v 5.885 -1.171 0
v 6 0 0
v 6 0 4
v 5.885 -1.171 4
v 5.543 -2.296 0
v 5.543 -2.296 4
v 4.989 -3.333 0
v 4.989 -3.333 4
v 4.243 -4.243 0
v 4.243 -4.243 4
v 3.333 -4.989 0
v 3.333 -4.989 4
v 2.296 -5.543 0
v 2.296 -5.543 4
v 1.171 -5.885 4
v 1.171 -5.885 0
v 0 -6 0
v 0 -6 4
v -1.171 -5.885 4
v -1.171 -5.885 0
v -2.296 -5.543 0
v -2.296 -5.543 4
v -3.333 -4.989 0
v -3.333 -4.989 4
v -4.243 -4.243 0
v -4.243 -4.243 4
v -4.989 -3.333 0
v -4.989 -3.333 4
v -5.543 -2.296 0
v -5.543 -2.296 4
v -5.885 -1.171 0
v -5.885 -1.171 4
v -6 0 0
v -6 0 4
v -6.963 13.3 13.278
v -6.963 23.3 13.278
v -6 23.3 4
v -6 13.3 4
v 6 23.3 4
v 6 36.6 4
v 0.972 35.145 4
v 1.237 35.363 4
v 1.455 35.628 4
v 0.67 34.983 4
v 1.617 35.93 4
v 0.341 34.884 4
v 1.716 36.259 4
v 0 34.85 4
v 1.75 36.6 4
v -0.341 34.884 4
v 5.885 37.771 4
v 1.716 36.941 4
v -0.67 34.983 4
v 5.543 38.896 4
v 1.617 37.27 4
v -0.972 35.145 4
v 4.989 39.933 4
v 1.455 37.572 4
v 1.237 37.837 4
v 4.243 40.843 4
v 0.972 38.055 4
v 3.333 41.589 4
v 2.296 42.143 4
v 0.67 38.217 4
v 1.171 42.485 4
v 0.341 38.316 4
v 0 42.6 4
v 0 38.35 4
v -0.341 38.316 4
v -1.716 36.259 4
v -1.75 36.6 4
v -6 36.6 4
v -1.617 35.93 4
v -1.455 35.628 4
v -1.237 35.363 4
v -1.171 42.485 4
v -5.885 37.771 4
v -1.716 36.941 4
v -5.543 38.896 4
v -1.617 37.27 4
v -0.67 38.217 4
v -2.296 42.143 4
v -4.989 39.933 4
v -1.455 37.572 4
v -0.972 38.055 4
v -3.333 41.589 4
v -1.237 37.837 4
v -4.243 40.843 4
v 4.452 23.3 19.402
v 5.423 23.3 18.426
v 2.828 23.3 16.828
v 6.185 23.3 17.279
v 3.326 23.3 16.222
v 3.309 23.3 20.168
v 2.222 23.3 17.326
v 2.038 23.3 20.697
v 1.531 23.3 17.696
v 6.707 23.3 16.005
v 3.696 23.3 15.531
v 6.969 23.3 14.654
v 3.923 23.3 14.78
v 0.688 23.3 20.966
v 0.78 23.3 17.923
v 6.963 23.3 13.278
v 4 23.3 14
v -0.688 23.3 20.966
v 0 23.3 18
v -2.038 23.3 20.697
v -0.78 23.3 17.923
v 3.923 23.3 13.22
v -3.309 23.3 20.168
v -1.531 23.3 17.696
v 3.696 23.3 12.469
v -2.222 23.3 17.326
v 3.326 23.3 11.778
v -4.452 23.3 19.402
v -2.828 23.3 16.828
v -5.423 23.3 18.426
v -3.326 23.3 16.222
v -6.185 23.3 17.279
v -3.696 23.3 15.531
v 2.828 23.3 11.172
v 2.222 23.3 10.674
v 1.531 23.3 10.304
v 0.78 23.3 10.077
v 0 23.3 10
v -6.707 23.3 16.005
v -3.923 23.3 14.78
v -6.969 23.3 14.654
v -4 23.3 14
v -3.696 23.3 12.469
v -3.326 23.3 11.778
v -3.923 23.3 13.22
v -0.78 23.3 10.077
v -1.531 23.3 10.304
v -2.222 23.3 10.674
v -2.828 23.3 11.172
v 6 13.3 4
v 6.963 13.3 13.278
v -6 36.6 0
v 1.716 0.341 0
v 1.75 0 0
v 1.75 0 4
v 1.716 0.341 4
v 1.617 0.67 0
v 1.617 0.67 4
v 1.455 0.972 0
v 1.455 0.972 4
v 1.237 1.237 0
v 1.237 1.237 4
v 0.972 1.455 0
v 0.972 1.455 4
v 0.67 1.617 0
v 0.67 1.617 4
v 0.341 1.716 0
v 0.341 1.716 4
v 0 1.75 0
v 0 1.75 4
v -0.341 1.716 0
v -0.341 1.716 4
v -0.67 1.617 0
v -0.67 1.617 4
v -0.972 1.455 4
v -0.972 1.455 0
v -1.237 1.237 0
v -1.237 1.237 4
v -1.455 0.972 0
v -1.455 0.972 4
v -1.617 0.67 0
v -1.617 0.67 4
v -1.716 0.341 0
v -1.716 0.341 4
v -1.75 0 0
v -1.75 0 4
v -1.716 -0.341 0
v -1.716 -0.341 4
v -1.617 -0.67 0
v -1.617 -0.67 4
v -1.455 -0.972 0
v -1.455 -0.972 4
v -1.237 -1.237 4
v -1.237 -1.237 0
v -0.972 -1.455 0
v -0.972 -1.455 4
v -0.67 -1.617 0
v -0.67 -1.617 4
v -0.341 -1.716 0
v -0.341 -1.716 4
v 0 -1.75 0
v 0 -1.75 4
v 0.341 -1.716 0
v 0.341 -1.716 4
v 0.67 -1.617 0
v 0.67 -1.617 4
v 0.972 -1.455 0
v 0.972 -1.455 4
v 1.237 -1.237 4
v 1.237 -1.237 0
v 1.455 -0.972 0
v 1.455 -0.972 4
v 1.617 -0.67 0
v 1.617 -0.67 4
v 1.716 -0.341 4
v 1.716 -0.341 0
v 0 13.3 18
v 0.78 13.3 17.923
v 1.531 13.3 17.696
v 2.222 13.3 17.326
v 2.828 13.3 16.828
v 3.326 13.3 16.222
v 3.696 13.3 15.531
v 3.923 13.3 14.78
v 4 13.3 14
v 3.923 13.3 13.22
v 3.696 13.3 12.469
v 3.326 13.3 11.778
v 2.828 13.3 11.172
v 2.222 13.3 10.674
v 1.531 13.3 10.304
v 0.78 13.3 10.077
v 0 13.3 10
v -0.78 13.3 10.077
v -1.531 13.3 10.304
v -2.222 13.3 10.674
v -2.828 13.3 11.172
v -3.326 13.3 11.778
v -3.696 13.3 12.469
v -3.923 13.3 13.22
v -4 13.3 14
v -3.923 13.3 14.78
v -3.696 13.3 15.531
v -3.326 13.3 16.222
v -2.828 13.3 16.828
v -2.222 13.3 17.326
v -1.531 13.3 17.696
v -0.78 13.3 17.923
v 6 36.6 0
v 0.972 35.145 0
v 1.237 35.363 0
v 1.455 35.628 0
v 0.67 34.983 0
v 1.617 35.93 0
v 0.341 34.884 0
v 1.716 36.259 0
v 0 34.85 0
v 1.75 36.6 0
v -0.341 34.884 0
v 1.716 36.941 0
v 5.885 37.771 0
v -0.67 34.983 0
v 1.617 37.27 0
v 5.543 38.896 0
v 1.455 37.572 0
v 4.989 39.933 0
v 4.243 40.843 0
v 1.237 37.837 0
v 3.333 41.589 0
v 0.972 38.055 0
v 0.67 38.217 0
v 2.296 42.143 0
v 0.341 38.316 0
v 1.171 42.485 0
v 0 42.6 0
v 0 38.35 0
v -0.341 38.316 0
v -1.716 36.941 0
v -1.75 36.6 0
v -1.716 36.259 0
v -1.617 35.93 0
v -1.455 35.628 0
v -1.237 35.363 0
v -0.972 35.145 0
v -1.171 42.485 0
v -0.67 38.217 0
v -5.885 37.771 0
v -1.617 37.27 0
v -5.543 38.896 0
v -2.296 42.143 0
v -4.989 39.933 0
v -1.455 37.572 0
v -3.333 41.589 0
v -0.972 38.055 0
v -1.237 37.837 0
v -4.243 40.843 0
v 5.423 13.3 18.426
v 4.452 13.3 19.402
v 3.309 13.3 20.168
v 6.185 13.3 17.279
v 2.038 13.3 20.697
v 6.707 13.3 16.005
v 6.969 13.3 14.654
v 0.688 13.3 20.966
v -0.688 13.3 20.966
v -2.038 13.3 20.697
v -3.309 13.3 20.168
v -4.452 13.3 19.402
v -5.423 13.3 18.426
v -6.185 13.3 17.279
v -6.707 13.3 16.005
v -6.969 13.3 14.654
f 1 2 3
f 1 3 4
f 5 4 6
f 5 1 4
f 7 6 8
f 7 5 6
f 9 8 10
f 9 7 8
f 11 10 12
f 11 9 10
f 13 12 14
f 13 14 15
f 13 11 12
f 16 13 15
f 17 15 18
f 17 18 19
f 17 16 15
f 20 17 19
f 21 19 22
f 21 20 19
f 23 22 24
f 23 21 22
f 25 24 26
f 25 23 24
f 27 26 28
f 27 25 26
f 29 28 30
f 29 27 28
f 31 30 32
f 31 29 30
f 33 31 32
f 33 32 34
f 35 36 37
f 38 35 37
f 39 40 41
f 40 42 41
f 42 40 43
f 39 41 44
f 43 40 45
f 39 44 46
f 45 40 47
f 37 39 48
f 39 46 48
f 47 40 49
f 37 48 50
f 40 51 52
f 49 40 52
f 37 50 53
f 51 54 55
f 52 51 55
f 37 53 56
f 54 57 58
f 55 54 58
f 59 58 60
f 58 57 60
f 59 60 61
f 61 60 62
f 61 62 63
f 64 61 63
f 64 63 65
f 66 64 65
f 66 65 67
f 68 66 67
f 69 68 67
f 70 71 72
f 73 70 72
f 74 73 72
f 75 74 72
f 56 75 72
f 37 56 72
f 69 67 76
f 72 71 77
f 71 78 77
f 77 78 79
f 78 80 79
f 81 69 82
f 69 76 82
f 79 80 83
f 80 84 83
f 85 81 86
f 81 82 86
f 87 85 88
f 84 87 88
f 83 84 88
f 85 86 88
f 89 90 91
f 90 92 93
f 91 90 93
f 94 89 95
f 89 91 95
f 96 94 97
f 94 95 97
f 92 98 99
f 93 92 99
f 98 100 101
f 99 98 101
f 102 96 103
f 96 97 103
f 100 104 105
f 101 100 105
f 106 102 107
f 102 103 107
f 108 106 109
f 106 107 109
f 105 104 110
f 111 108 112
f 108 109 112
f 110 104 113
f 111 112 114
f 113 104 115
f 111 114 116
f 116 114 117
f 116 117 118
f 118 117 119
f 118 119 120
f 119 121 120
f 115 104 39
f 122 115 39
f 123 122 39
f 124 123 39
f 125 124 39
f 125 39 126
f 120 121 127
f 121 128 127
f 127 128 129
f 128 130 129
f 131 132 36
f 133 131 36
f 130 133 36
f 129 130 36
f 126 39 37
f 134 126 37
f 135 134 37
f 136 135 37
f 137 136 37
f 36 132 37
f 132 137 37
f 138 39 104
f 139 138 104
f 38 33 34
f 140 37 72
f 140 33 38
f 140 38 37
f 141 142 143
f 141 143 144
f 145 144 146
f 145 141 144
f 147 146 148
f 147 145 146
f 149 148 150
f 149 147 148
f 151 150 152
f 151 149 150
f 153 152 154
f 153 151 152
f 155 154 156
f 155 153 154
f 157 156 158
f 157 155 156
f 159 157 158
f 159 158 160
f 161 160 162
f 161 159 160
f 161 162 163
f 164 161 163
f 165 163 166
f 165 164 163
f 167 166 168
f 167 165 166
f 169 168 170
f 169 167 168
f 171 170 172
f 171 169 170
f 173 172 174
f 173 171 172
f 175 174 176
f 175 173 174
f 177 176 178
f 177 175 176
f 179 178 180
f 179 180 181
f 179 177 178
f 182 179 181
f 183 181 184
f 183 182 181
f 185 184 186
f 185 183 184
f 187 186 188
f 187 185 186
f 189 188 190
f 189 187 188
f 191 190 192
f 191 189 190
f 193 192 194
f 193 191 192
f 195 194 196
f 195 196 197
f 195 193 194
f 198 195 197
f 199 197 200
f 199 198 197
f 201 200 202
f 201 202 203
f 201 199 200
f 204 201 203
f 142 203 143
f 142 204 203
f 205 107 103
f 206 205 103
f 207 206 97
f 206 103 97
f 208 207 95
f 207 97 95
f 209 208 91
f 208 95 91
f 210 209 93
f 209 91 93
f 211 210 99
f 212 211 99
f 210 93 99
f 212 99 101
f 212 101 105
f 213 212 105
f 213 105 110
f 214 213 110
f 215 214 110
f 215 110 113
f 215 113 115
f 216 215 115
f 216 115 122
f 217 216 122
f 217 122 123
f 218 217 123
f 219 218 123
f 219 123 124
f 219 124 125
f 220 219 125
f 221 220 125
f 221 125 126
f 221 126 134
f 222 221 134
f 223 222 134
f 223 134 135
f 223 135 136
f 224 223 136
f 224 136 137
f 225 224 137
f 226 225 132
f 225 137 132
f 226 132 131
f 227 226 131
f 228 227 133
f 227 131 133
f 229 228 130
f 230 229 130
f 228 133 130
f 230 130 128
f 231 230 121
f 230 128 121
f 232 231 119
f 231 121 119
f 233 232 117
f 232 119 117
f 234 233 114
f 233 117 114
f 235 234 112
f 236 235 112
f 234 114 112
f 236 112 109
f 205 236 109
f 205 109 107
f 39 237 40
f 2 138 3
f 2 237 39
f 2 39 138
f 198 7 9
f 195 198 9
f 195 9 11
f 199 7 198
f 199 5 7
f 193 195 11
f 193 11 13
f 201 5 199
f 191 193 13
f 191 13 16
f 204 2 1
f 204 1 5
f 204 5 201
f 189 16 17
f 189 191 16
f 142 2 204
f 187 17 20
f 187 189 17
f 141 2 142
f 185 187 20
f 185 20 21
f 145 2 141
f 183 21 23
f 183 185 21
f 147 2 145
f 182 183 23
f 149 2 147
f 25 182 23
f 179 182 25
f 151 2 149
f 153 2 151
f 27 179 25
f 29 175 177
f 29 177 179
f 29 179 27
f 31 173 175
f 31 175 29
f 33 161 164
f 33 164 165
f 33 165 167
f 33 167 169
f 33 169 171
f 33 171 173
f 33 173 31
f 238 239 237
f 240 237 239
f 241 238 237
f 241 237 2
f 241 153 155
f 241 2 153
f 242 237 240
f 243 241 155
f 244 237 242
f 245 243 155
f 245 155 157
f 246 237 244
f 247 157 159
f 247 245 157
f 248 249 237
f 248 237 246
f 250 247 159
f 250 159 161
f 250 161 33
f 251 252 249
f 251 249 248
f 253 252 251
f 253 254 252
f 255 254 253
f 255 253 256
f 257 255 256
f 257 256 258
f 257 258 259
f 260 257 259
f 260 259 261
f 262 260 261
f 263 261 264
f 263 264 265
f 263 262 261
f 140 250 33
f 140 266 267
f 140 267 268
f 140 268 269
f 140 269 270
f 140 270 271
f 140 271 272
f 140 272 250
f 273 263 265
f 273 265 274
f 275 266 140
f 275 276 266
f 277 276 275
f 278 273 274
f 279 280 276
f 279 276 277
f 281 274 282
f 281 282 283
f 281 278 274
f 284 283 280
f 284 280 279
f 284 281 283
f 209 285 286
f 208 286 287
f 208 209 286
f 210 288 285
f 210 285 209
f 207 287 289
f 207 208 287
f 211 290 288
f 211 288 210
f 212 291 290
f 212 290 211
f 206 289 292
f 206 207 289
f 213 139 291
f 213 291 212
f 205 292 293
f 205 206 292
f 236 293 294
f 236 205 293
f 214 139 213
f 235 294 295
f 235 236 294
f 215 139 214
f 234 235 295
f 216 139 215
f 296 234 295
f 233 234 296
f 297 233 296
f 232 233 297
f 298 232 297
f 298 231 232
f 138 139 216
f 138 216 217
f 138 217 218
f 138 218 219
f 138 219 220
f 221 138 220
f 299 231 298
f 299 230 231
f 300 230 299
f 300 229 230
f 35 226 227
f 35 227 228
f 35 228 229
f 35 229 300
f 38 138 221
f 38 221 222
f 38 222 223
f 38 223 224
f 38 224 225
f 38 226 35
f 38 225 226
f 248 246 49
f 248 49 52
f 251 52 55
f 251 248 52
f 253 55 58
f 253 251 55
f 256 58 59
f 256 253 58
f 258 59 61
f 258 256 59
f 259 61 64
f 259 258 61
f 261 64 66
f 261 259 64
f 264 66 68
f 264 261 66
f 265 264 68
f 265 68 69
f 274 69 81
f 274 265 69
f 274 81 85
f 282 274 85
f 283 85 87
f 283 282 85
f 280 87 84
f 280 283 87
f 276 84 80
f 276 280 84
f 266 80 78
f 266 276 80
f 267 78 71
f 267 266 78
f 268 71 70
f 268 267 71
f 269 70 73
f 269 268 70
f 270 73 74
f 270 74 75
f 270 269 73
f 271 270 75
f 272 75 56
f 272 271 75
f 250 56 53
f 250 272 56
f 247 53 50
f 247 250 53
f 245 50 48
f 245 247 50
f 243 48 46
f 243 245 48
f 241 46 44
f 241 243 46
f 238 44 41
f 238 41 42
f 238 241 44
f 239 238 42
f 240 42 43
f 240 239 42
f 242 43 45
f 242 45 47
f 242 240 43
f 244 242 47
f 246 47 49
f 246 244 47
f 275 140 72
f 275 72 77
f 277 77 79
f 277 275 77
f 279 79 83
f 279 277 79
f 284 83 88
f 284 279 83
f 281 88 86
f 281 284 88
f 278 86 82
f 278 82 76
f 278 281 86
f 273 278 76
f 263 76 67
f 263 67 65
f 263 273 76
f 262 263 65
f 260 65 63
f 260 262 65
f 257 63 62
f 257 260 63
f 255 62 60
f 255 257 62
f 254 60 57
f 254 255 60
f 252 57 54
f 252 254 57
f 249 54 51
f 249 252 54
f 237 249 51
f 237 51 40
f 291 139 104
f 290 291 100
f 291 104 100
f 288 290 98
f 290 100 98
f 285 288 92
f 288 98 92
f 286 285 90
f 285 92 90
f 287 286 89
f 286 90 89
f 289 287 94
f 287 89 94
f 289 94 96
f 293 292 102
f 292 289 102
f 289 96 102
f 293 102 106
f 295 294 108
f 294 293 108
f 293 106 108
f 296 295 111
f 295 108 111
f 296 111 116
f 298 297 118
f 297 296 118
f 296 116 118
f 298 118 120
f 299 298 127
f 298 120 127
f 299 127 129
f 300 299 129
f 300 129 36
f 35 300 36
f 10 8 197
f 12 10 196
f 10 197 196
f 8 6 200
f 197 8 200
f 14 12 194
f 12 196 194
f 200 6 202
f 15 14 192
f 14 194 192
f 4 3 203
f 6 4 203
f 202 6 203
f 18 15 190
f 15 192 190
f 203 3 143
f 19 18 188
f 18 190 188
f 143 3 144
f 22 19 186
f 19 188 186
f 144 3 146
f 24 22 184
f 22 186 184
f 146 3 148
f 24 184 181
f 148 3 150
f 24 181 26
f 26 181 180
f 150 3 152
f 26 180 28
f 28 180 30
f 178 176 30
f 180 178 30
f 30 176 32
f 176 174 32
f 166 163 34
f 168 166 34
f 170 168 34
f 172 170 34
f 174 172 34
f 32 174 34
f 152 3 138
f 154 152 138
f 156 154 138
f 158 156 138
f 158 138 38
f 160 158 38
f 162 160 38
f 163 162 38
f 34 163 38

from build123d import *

# Parameters (mm, degrees)
ESBO_O1_R                = 1.75
RESSALTO_EXTRUS_O1_DEPTH = 4
ESBO_O2_W                = 32.967162932
ESBO_O2_H                = 10
RESSALTO_EXTRUS_O2_DEPTH = 25
ESBO_O3_R                = 4
CORTE_EXTRUS_O3_DEPTH    = 42.895088709


with BuildPart() as part:
    # Esboço1 → Ressalto-extrusão1 (new body)
    with BuildSketch(Plane.XY):
        with BuildLine():
            Line((-6, 0), (-6, 36.6))
            ThreePointArc((-6, 36.6), (0, 42.6), (6, 36.6))
            Line((6, 36.6), (6, 0))
            ThreePointArc((6, 0), (0, -6), (-6, 0))
        make_face()
        Circle(ESBO_O1_R, mode=Mode.SUBTRACT)
        with Locations((0, 36.6)):
            Circle(ESBO_O1_R, mode=Mode.SUBTRACT)
    extrude(amount=RESSALTO_EXTRUS_O1_DEPTH)

    # Esboço2 → Ressalto-extrusão2 (add)
    with BuildSketch(Plane(origin=(0, 0, 0), x_dir=(-1, 0, 0), z_dir=(0, 0, -1))):
        with Locations((0, 18.3)):
            Rectangle(ESBO_O2_W, ESBO_O2_H)
    extrude(amount=-RESSALTO_EXTRUS_O2_DEPTH)

    # Esboço3 → Corte-extrusão3 (cut, through all)
    with BuildSketch(Plane(origin=(0, 23.3, 0), x_dir=(1, 0, 0), z_dir=(0, 1, 0))):
        with BuildLine():
            Line((-6.962621571, -13.277572943), (-6, -4))
            Line((-6, -4), (-6, 0))
            Line((-6, 0), (-16.483581466, 0))
            Line((-16.483581466, 0), (-16.483581466, -25))
            Line((-16.483581466, -25), (16.483581466, -25))
            Line((16.483581466, -25), (16.483581466, 0))
            Line((16.483581466, 0), (6, 0))
            Line((6, 0), (6, -4))
            Line((6, -4), (6.962621571, -13.277572943))
            ThreePointArc((6.962621571, -13.277572943), (0, -21), (-6.962621571, -13.277572943))
        make_face()
        with Locations(Location((0, -14, 0), (0, 0, 270))):
            Circle(ESBO_O3_R)
    extrude(amount=-CORTE_EXTRUS_O3_DEPTH, mode=Mode.SUBTRACT)


solid = part.part
